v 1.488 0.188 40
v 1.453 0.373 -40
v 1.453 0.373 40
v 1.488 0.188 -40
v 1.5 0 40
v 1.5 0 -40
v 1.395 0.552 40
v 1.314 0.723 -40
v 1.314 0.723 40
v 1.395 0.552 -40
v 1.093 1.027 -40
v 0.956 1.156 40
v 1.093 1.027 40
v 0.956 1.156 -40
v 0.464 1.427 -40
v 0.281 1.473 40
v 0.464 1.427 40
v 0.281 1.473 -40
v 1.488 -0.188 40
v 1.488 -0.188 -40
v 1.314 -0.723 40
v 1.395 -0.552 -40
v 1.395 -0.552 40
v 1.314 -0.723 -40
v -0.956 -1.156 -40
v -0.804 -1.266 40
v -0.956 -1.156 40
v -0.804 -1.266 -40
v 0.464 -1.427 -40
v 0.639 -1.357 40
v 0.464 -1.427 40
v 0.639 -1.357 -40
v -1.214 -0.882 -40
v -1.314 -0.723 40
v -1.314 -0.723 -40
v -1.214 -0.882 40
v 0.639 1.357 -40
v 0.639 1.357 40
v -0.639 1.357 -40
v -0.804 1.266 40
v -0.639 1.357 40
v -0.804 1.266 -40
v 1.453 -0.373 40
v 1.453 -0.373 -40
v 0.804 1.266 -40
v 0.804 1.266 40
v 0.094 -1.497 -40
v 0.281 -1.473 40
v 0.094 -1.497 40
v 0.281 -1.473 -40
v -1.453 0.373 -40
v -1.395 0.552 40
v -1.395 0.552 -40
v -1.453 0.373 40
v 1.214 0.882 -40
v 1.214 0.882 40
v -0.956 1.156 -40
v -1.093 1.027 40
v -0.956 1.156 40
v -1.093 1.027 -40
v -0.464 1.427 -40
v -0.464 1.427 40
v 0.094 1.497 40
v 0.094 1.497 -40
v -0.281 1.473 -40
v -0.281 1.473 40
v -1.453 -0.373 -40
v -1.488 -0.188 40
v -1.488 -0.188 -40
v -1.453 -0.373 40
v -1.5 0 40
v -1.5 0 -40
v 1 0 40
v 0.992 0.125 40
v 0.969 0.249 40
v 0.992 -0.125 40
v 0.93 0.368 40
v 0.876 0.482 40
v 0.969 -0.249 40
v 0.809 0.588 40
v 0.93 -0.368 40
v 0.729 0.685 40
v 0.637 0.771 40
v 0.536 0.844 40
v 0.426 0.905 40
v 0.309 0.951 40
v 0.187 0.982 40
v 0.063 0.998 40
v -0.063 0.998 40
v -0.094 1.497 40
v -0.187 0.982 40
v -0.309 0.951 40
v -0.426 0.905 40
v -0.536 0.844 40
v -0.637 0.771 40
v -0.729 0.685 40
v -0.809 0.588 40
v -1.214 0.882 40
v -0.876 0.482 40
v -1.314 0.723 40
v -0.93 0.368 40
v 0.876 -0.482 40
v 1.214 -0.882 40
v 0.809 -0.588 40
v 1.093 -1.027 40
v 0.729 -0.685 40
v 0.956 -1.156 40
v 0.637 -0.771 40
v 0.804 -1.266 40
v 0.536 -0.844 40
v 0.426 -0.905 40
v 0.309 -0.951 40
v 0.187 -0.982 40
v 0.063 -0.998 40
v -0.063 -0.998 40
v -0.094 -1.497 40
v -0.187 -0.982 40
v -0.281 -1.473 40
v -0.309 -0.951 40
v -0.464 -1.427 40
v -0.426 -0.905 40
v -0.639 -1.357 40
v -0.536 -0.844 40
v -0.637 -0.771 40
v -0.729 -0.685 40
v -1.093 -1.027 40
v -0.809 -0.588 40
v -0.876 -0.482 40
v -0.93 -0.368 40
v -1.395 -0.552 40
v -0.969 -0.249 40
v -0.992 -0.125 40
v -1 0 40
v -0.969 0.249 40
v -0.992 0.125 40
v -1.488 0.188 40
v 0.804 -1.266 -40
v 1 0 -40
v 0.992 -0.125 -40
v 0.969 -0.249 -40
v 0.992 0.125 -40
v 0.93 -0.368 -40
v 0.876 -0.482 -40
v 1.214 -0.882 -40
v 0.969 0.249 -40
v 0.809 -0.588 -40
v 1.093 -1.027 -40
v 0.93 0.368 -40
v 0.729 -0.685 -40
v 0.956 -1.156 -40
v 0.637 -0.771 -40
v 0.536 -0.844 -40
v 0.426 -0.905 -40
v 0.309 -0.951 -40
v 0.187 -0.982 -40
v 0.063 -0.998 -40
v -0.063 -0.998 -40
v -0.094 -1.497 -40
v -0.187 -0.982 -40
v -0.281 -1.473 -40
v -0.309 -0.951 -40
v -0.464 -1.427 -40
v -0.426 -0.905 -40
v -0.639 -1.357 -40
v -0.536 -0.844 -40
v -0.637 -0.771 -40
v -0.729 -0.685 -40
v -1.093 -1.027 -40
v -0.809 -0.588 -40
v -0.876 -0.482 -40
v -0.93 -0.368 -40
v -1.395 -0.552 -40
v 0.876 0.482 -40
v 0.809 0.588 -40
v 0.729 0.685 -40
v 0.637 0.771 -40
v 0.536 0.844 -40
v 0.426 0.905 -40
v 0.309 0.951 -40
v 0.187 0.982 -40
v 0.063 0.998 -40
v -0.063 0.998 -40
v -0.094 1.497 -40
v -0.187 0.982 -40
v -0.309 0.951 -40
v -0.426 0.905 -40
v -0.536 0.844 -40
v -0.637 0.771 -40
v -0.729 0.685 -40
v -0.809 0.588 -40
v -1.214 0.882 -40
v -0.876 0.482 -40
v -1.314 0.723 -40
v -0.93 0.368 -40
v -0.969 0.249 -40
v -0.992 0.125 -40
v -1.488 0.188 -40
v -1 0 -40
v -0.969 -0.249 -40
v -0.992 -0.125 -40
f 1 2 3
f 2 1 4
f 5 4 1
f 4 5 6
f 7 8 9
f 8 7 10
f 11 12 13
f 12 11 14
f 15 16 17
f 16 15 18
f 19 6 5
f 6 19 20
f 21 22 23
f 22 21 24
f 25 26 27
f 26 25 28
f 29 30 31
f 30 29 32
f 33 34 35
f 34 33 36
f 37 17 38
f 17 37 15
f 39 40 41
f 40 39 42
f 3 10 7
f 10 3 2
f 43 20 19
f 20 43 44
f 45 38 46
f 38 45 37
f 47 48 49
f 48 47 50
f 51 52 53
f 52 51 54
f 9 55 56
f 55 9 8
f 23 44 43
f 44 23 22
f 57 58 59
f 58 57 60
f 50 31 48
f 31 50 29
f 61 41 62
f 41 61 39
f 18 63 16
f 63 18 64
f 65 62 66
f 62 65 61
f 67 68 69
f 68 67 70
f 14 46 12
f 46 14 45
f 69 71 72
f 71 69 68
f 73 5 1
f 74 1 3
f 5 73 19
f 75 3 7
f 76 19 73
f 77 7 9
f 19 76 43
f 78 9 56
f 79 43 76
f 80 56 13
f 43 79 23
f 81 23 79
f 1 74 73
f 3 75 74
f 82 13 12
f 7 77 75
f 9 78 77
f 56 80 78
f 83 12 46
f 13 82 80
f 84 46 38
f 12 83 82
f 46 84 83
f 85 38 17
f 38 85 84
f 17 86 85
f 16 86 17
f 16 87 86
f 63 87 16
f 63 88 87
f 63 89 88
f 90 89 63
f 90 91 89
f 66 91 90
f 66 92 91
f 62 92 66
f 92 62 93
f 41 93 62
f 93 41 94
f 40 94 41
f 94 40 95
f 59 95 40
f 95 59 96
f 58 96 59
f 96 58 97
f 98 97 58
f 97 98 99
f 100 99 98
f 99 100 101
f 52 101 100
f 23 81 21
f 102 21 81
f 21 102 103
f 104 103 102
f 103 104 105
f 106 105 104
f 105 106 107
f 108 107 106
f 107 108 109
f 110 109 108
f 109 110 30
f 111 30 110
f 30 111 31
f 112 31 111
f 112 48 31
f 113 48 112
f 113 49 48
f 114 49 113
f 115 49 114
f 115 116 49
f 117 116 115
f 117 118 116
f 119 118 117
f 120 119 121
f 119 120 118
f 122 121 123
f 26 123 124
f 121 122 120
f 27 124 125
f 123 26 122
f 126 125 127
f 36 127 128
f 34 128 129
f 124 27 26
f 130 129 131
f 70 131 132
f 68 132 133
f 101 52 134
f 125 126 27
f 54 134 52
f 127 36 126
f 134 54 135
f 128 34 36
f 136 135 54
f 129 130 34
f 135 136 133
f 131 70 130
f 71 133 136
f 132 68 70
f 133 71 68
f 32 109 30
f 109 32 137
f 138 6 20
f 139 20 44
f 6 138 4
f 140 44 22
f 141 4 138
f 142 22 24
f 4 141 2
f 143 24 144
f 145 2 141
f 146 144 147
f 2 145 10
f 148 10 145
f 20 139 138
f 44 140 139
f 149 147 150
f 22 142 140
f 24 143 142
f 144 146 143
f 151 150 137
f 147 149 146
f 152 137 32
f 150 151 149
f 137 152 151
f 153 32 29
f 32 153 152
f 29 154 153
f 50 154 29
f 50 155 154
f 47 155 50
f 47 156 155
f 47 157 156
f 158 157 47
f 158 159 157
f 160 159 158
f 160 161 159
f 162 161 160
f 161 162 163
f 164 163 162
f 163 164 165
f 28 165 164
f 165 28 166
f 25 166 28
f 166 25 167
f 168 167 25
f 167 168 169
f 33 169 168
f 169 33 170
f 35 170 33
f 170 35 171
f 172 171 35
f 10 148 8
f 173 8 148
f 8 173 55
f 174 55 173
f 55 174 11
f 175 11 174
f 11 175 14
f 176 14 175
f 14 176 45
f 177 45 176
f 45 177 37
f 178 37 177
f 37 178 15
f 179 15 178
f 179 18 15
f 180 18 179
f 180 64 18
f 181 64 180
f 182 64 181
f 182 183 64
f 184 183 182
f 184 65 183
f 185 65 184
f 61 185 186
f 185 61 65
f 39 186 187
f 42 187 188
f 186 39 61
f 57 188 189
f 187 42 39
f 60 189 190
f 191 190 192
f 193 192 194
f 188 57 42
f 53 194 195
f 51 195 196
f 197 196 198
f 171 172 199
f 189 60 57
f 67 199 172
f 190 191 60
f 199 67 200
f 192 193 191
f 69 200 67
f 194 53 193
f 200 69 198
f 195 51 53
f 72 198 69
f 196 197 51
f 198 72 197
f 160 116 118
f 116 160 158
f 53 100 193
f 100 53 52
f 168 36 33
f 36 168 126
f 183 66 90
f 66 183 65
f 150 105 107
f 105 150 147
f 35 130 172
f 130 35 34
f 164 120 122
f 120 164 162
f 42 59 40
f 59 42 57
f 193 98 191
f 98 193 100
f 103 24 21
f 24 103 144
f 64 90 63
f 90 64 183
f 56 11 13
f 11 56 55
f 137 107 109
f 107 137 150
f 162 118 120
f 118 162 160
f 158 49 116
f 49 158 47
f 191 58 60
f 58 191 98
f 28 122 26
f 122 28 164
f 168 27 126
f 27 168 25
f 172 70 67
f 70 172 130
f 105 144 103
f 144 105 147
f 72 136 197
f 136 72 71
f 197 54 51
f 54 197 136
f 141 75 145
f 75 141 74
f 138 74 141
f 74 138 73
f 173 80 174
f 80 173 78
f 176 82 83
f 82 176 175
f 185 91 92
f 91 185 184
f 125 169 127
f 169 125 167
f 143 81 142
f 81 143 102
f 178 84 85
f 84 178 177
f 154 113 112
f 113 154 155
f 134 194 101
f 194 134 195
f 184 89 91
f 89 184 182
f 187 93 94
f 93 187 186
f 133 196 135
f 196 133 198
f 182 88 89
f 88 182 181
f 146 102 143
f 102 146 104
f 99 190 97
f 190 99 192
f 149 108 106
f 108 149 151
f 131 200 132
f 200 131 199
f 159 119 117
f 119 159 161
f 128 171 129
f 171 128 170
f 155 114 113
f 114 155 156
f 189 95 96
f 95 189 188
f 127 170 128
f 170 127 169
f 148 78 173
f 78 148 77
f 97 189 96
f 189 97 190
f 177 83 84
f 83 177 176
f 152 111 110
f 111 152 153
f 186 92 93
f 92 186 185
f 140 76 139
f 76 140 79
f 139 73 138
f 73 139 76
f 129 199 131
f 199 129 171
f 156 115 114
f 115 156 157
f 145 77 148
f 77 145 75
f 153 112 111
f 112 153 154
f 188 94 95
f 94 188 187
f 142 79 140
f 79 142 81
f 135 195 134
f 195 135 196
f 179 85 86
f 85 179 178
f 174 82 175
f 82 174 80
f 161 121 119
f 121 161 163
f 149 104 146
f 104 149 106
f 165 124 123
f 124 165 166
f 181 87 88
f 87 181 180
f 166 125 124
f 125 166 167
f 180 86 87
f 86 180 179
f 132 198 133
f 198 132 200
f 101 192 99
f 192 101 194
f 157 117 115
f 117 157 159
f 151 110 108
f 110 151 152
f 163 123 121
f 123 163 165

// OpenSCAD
$fn = 50;


difference() {
	union() {
		translate(v = [0, 0, -40.0000000000]) {
			cylinder(h = 80, r = 1.5000000000);
		}
	}
	union() {
		translate(v = [0, 0, -100.0000000000]) {
			cylinder(h = 200, r = 1.0000000000);
		}
	}
}
